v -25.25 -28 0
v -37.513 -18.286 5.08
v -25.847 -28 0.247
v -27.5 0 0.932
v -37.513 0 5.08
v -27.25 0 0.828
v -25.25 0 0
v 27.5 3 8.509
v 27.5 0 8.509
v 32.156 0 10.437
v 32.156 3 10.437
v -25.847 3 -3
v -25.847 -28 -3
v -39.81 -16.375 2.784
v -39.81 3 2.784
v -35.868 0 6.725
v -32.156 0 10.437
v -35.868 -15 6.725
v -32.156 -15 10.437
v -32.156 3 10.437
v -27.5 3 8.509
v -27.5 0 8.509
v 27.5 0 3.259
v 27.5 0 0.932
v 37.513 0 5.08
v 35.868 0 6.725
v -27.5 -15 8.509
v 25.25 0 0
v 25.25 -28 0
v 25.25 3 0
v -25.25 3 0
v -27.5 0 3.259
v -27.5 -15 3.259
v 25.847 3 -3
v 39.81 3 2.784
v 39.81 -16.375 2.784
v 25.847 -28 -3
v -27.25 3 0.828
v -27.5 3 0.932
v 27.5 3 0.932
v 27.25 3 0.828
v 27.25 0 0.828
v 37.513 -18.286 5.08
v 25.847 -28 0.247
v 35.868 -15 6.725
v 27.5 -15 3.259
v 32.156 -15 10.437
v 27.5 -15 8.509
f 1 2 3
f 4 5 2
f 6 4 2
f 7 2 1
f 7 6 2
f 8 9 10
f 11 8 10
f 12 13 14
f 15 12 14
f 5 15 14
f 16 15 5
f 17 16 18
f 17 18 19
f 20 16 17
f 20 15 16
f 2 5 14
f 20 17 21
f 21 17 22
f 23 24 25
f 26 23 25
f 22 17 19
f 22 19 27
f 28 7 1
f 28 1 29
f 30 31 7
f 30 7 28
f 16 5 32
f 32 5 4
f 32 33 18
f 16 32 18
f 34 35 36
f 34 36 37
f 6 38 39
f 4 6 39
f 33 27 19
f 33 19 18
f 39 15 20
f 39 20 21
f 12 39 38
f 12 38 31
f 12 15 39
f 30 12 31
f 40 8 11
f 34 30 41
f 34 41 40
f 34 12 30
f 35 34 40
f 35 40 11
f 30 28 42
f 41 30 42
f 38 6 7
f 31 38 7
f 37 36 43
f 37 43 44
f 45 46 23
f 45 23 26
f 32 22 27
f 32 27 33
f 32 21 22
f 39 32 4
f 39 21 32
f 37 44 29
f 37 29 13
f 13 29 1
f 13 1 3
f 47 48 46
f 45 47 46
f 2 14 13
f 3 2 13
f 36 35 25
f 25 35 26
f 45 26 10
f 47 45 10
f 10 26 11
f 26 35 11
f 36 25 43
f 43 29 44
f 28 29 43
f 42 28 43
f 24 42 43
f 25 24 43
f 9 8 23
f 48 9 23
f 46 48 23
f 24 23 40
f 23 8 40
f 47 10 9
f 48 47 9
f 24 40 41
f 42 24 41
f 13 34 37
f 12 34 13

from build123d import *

# Parameters (mm, degrees)
BOSS_EXTRUDE1_DEPTH = 3
BOSS_EXTRUDE2_DEPTH = 28
CUT_EXTRUDE1_DEPTH  = 30
CUT_EXTRUDE2_DEPTH  = 30
CUT_EXTRUDE3_REACH  = 55.204
CUT_EXTRUDE4_DEPTH  = 31
BOSS_EXTRUDE3_DEPTH = 15


with BuildPart() as part:
    # Sketch2 → Boss-Extrude1 (new body)
    with BuildSketch(Plane(origin=(0, 0, 0), x_dir=(1, 0, 0), z_dir=(0, 1, 0))):
        Polygon((-27.25, -8.405172527), (-27.25, -0.828427125), (-25.25, 0), (25.25, 0), (27.25, -0.828427125), (27.25, -8.405172527), (36.155887914, -12.094112086), (41.513455967, -6.736544033), (41.513455967, -3.489367432), (25.846737102, 3), (-25.846737102, 3), (-41.513455967, -3.489367432), (-41.513455967, -6.736544033), (-36.155887914, -12.094112086), align=None)
    extrude(amount=BOSS_EXTRUDE1_DEPTH)

    # Sketch3 → Boss-Extrude2 (add)
    with BuildSketch(Plane.XZ):
        Polygon((-41.513455967, 6.736544033), (-25.25, 0), (25.25, 0), (41.513455967, 6.736544033), (41.513455967, 3.489367432), (25.846737102, -3), (-25.846737102, -3), (-41.513455967, 3.489367432), align=None)
    extrude(amount=BOSS_EXTRUDE2_DEPTH)

    # Sketch4 → Cut-Extrude1 (cut, along a direction that is not the sketch's normal)
    with BuildSketch(Plane(origin=(-4.845827185, 0, -11.69886171), x_dir=(-0.9238795325112868, 0, 0.38268343236508967), z_dir=(-0.3826834323650896, 0, -0.9238795325112867))):
        Polygon((40.931396085, -14), (22.731221094, -28), (40.931396085, -28), align=None)
    extrude(amount=-CUT_EXTRUDE1_DEPTH, dir=(0, 0, -1), mode=Mode.SUBTRACT)

    # Sketch5 → Cut-Extrude2 (cut, along a direction that is not the sketch's normal)
    with BuildSketch(Plane(origin=(4.845827185, 0, -11.69886171), x_dir=(-0.923879532511309, 0, -0.3826834323650361), z_dir=(0.38268343236503605, 0, -0.9238795325113089))):
        Polygon((-40.931396085, -14), (-22.731221094, -28), (-40.931396085, -28), align=None)
    extrude(amount=-CUT_EXTRUDE2_DEPTH, dir=(0, 0, -1), mode=Mode.SUBTRACT)

    # Cut-Extrude3: up to this face of the body (flat: up to its plane)
    cut_extrude3_end = Plane(part.part.faces().sort_by_distance((0, -28, -1.498496392))[0])
    # Sketch6 → Cut-Extrude3 (cut, up to the picked face)
    with BuildSketch(Plane(origin=(0, 3, 0), x_dir=(1, 0, 0), z_dir=(0, 1, 0)), mode=Mode.PRIVATE) as cut_extrude3_sk1:
        Polygon((-39.809556561, -2.783589189), (-32.155887914, -10.437257836), (-36.155887914, -12.094112086), (-41.513455967, -6.736544033), (-41.513455967, -3.489367432), align=None)
    cut_extrude3_tool1 = split(extrude(cut_extrude3_sk1.sketch, amount=-CUT_EXTRUDE3_REACH, mode=Mode.PRIVATE), bisect_by=cut_extrude3_end, keep=Keep.BOTH, mode=Mode.PRIVATE)
    # Sketch6 → Cut-Extrude3 (cut, up to the picked face)
    with BuildSketch(Plane(origin=(0, 3, 0), x_dir=(1, 0, 0), z_dir=(0, 1, 0)), mode=Mode.PRIVATE) as cut_extrude3_sk2:
        Polygon((39.809556561, -2.783589189), (32.155887914, -10.437257836), (36.155887914, -12.094112086), (41.513455967, -6.736544033), (41.513455967, -3.489367432), align=None)
    cut_extrude3_tool2 = split(extrude(cut_extrude3_sk2.sketch, amount=-CUT_EXTRUDE3_REACH, mode=Mode.PRIVATE), bisect_by=cut_extrude3_end, keep=Keep.BOTH, mode=Mode.PRIVATE)
    add(cut_extrude3_tool1.solids().sort_by(Axis((-37.57796, 3, 7.679108), (0, -1, 0)))[0], mode=Mode.SUBTRACT)
    add(cut_extrude3_tool2.solids().sort_by(Axis((37.57796, 3, 7.679108), (0, -1, 0)))[0], mode=Mode.SUBTRACT)

    # Sketch7 → Cut-Extrude4 (cut)
    with BuildSketch(Plane(origin=(0, 3, 0), x_dir=(1, 0, 0), z_dir=(0, 1, 0))):
        Polygon((-25.25, 0), (-27.5, -0.931980515), (-27.5, -8.508725917), (27.5, -8.508725917), (27.5, -0.931980515), (25.25, 0), align=None)
    extrude(amount=-CUT_EXTRUDE4_DEPTH, mode=Mode.SUBTRACT)

    # Sketch8 → Boss-Extrude3 (add)
    with BuildSketch(Plane.XZ):
        Polygon((-32.155887914, 10.437257836), (-27.5, 8.508725917), (-27.5, 3.259123746), (-35.867917208, 6.725228542), align=None)
        Polygon((27.5, 3.259123746), (35.867917208, 6.725228542), (32.155887914, 10.437257836), (27.5, 8.508725917), align=None)
    extrude(amount=BOSS_EXTRUDE3_DEPTH)


solid = part.part
